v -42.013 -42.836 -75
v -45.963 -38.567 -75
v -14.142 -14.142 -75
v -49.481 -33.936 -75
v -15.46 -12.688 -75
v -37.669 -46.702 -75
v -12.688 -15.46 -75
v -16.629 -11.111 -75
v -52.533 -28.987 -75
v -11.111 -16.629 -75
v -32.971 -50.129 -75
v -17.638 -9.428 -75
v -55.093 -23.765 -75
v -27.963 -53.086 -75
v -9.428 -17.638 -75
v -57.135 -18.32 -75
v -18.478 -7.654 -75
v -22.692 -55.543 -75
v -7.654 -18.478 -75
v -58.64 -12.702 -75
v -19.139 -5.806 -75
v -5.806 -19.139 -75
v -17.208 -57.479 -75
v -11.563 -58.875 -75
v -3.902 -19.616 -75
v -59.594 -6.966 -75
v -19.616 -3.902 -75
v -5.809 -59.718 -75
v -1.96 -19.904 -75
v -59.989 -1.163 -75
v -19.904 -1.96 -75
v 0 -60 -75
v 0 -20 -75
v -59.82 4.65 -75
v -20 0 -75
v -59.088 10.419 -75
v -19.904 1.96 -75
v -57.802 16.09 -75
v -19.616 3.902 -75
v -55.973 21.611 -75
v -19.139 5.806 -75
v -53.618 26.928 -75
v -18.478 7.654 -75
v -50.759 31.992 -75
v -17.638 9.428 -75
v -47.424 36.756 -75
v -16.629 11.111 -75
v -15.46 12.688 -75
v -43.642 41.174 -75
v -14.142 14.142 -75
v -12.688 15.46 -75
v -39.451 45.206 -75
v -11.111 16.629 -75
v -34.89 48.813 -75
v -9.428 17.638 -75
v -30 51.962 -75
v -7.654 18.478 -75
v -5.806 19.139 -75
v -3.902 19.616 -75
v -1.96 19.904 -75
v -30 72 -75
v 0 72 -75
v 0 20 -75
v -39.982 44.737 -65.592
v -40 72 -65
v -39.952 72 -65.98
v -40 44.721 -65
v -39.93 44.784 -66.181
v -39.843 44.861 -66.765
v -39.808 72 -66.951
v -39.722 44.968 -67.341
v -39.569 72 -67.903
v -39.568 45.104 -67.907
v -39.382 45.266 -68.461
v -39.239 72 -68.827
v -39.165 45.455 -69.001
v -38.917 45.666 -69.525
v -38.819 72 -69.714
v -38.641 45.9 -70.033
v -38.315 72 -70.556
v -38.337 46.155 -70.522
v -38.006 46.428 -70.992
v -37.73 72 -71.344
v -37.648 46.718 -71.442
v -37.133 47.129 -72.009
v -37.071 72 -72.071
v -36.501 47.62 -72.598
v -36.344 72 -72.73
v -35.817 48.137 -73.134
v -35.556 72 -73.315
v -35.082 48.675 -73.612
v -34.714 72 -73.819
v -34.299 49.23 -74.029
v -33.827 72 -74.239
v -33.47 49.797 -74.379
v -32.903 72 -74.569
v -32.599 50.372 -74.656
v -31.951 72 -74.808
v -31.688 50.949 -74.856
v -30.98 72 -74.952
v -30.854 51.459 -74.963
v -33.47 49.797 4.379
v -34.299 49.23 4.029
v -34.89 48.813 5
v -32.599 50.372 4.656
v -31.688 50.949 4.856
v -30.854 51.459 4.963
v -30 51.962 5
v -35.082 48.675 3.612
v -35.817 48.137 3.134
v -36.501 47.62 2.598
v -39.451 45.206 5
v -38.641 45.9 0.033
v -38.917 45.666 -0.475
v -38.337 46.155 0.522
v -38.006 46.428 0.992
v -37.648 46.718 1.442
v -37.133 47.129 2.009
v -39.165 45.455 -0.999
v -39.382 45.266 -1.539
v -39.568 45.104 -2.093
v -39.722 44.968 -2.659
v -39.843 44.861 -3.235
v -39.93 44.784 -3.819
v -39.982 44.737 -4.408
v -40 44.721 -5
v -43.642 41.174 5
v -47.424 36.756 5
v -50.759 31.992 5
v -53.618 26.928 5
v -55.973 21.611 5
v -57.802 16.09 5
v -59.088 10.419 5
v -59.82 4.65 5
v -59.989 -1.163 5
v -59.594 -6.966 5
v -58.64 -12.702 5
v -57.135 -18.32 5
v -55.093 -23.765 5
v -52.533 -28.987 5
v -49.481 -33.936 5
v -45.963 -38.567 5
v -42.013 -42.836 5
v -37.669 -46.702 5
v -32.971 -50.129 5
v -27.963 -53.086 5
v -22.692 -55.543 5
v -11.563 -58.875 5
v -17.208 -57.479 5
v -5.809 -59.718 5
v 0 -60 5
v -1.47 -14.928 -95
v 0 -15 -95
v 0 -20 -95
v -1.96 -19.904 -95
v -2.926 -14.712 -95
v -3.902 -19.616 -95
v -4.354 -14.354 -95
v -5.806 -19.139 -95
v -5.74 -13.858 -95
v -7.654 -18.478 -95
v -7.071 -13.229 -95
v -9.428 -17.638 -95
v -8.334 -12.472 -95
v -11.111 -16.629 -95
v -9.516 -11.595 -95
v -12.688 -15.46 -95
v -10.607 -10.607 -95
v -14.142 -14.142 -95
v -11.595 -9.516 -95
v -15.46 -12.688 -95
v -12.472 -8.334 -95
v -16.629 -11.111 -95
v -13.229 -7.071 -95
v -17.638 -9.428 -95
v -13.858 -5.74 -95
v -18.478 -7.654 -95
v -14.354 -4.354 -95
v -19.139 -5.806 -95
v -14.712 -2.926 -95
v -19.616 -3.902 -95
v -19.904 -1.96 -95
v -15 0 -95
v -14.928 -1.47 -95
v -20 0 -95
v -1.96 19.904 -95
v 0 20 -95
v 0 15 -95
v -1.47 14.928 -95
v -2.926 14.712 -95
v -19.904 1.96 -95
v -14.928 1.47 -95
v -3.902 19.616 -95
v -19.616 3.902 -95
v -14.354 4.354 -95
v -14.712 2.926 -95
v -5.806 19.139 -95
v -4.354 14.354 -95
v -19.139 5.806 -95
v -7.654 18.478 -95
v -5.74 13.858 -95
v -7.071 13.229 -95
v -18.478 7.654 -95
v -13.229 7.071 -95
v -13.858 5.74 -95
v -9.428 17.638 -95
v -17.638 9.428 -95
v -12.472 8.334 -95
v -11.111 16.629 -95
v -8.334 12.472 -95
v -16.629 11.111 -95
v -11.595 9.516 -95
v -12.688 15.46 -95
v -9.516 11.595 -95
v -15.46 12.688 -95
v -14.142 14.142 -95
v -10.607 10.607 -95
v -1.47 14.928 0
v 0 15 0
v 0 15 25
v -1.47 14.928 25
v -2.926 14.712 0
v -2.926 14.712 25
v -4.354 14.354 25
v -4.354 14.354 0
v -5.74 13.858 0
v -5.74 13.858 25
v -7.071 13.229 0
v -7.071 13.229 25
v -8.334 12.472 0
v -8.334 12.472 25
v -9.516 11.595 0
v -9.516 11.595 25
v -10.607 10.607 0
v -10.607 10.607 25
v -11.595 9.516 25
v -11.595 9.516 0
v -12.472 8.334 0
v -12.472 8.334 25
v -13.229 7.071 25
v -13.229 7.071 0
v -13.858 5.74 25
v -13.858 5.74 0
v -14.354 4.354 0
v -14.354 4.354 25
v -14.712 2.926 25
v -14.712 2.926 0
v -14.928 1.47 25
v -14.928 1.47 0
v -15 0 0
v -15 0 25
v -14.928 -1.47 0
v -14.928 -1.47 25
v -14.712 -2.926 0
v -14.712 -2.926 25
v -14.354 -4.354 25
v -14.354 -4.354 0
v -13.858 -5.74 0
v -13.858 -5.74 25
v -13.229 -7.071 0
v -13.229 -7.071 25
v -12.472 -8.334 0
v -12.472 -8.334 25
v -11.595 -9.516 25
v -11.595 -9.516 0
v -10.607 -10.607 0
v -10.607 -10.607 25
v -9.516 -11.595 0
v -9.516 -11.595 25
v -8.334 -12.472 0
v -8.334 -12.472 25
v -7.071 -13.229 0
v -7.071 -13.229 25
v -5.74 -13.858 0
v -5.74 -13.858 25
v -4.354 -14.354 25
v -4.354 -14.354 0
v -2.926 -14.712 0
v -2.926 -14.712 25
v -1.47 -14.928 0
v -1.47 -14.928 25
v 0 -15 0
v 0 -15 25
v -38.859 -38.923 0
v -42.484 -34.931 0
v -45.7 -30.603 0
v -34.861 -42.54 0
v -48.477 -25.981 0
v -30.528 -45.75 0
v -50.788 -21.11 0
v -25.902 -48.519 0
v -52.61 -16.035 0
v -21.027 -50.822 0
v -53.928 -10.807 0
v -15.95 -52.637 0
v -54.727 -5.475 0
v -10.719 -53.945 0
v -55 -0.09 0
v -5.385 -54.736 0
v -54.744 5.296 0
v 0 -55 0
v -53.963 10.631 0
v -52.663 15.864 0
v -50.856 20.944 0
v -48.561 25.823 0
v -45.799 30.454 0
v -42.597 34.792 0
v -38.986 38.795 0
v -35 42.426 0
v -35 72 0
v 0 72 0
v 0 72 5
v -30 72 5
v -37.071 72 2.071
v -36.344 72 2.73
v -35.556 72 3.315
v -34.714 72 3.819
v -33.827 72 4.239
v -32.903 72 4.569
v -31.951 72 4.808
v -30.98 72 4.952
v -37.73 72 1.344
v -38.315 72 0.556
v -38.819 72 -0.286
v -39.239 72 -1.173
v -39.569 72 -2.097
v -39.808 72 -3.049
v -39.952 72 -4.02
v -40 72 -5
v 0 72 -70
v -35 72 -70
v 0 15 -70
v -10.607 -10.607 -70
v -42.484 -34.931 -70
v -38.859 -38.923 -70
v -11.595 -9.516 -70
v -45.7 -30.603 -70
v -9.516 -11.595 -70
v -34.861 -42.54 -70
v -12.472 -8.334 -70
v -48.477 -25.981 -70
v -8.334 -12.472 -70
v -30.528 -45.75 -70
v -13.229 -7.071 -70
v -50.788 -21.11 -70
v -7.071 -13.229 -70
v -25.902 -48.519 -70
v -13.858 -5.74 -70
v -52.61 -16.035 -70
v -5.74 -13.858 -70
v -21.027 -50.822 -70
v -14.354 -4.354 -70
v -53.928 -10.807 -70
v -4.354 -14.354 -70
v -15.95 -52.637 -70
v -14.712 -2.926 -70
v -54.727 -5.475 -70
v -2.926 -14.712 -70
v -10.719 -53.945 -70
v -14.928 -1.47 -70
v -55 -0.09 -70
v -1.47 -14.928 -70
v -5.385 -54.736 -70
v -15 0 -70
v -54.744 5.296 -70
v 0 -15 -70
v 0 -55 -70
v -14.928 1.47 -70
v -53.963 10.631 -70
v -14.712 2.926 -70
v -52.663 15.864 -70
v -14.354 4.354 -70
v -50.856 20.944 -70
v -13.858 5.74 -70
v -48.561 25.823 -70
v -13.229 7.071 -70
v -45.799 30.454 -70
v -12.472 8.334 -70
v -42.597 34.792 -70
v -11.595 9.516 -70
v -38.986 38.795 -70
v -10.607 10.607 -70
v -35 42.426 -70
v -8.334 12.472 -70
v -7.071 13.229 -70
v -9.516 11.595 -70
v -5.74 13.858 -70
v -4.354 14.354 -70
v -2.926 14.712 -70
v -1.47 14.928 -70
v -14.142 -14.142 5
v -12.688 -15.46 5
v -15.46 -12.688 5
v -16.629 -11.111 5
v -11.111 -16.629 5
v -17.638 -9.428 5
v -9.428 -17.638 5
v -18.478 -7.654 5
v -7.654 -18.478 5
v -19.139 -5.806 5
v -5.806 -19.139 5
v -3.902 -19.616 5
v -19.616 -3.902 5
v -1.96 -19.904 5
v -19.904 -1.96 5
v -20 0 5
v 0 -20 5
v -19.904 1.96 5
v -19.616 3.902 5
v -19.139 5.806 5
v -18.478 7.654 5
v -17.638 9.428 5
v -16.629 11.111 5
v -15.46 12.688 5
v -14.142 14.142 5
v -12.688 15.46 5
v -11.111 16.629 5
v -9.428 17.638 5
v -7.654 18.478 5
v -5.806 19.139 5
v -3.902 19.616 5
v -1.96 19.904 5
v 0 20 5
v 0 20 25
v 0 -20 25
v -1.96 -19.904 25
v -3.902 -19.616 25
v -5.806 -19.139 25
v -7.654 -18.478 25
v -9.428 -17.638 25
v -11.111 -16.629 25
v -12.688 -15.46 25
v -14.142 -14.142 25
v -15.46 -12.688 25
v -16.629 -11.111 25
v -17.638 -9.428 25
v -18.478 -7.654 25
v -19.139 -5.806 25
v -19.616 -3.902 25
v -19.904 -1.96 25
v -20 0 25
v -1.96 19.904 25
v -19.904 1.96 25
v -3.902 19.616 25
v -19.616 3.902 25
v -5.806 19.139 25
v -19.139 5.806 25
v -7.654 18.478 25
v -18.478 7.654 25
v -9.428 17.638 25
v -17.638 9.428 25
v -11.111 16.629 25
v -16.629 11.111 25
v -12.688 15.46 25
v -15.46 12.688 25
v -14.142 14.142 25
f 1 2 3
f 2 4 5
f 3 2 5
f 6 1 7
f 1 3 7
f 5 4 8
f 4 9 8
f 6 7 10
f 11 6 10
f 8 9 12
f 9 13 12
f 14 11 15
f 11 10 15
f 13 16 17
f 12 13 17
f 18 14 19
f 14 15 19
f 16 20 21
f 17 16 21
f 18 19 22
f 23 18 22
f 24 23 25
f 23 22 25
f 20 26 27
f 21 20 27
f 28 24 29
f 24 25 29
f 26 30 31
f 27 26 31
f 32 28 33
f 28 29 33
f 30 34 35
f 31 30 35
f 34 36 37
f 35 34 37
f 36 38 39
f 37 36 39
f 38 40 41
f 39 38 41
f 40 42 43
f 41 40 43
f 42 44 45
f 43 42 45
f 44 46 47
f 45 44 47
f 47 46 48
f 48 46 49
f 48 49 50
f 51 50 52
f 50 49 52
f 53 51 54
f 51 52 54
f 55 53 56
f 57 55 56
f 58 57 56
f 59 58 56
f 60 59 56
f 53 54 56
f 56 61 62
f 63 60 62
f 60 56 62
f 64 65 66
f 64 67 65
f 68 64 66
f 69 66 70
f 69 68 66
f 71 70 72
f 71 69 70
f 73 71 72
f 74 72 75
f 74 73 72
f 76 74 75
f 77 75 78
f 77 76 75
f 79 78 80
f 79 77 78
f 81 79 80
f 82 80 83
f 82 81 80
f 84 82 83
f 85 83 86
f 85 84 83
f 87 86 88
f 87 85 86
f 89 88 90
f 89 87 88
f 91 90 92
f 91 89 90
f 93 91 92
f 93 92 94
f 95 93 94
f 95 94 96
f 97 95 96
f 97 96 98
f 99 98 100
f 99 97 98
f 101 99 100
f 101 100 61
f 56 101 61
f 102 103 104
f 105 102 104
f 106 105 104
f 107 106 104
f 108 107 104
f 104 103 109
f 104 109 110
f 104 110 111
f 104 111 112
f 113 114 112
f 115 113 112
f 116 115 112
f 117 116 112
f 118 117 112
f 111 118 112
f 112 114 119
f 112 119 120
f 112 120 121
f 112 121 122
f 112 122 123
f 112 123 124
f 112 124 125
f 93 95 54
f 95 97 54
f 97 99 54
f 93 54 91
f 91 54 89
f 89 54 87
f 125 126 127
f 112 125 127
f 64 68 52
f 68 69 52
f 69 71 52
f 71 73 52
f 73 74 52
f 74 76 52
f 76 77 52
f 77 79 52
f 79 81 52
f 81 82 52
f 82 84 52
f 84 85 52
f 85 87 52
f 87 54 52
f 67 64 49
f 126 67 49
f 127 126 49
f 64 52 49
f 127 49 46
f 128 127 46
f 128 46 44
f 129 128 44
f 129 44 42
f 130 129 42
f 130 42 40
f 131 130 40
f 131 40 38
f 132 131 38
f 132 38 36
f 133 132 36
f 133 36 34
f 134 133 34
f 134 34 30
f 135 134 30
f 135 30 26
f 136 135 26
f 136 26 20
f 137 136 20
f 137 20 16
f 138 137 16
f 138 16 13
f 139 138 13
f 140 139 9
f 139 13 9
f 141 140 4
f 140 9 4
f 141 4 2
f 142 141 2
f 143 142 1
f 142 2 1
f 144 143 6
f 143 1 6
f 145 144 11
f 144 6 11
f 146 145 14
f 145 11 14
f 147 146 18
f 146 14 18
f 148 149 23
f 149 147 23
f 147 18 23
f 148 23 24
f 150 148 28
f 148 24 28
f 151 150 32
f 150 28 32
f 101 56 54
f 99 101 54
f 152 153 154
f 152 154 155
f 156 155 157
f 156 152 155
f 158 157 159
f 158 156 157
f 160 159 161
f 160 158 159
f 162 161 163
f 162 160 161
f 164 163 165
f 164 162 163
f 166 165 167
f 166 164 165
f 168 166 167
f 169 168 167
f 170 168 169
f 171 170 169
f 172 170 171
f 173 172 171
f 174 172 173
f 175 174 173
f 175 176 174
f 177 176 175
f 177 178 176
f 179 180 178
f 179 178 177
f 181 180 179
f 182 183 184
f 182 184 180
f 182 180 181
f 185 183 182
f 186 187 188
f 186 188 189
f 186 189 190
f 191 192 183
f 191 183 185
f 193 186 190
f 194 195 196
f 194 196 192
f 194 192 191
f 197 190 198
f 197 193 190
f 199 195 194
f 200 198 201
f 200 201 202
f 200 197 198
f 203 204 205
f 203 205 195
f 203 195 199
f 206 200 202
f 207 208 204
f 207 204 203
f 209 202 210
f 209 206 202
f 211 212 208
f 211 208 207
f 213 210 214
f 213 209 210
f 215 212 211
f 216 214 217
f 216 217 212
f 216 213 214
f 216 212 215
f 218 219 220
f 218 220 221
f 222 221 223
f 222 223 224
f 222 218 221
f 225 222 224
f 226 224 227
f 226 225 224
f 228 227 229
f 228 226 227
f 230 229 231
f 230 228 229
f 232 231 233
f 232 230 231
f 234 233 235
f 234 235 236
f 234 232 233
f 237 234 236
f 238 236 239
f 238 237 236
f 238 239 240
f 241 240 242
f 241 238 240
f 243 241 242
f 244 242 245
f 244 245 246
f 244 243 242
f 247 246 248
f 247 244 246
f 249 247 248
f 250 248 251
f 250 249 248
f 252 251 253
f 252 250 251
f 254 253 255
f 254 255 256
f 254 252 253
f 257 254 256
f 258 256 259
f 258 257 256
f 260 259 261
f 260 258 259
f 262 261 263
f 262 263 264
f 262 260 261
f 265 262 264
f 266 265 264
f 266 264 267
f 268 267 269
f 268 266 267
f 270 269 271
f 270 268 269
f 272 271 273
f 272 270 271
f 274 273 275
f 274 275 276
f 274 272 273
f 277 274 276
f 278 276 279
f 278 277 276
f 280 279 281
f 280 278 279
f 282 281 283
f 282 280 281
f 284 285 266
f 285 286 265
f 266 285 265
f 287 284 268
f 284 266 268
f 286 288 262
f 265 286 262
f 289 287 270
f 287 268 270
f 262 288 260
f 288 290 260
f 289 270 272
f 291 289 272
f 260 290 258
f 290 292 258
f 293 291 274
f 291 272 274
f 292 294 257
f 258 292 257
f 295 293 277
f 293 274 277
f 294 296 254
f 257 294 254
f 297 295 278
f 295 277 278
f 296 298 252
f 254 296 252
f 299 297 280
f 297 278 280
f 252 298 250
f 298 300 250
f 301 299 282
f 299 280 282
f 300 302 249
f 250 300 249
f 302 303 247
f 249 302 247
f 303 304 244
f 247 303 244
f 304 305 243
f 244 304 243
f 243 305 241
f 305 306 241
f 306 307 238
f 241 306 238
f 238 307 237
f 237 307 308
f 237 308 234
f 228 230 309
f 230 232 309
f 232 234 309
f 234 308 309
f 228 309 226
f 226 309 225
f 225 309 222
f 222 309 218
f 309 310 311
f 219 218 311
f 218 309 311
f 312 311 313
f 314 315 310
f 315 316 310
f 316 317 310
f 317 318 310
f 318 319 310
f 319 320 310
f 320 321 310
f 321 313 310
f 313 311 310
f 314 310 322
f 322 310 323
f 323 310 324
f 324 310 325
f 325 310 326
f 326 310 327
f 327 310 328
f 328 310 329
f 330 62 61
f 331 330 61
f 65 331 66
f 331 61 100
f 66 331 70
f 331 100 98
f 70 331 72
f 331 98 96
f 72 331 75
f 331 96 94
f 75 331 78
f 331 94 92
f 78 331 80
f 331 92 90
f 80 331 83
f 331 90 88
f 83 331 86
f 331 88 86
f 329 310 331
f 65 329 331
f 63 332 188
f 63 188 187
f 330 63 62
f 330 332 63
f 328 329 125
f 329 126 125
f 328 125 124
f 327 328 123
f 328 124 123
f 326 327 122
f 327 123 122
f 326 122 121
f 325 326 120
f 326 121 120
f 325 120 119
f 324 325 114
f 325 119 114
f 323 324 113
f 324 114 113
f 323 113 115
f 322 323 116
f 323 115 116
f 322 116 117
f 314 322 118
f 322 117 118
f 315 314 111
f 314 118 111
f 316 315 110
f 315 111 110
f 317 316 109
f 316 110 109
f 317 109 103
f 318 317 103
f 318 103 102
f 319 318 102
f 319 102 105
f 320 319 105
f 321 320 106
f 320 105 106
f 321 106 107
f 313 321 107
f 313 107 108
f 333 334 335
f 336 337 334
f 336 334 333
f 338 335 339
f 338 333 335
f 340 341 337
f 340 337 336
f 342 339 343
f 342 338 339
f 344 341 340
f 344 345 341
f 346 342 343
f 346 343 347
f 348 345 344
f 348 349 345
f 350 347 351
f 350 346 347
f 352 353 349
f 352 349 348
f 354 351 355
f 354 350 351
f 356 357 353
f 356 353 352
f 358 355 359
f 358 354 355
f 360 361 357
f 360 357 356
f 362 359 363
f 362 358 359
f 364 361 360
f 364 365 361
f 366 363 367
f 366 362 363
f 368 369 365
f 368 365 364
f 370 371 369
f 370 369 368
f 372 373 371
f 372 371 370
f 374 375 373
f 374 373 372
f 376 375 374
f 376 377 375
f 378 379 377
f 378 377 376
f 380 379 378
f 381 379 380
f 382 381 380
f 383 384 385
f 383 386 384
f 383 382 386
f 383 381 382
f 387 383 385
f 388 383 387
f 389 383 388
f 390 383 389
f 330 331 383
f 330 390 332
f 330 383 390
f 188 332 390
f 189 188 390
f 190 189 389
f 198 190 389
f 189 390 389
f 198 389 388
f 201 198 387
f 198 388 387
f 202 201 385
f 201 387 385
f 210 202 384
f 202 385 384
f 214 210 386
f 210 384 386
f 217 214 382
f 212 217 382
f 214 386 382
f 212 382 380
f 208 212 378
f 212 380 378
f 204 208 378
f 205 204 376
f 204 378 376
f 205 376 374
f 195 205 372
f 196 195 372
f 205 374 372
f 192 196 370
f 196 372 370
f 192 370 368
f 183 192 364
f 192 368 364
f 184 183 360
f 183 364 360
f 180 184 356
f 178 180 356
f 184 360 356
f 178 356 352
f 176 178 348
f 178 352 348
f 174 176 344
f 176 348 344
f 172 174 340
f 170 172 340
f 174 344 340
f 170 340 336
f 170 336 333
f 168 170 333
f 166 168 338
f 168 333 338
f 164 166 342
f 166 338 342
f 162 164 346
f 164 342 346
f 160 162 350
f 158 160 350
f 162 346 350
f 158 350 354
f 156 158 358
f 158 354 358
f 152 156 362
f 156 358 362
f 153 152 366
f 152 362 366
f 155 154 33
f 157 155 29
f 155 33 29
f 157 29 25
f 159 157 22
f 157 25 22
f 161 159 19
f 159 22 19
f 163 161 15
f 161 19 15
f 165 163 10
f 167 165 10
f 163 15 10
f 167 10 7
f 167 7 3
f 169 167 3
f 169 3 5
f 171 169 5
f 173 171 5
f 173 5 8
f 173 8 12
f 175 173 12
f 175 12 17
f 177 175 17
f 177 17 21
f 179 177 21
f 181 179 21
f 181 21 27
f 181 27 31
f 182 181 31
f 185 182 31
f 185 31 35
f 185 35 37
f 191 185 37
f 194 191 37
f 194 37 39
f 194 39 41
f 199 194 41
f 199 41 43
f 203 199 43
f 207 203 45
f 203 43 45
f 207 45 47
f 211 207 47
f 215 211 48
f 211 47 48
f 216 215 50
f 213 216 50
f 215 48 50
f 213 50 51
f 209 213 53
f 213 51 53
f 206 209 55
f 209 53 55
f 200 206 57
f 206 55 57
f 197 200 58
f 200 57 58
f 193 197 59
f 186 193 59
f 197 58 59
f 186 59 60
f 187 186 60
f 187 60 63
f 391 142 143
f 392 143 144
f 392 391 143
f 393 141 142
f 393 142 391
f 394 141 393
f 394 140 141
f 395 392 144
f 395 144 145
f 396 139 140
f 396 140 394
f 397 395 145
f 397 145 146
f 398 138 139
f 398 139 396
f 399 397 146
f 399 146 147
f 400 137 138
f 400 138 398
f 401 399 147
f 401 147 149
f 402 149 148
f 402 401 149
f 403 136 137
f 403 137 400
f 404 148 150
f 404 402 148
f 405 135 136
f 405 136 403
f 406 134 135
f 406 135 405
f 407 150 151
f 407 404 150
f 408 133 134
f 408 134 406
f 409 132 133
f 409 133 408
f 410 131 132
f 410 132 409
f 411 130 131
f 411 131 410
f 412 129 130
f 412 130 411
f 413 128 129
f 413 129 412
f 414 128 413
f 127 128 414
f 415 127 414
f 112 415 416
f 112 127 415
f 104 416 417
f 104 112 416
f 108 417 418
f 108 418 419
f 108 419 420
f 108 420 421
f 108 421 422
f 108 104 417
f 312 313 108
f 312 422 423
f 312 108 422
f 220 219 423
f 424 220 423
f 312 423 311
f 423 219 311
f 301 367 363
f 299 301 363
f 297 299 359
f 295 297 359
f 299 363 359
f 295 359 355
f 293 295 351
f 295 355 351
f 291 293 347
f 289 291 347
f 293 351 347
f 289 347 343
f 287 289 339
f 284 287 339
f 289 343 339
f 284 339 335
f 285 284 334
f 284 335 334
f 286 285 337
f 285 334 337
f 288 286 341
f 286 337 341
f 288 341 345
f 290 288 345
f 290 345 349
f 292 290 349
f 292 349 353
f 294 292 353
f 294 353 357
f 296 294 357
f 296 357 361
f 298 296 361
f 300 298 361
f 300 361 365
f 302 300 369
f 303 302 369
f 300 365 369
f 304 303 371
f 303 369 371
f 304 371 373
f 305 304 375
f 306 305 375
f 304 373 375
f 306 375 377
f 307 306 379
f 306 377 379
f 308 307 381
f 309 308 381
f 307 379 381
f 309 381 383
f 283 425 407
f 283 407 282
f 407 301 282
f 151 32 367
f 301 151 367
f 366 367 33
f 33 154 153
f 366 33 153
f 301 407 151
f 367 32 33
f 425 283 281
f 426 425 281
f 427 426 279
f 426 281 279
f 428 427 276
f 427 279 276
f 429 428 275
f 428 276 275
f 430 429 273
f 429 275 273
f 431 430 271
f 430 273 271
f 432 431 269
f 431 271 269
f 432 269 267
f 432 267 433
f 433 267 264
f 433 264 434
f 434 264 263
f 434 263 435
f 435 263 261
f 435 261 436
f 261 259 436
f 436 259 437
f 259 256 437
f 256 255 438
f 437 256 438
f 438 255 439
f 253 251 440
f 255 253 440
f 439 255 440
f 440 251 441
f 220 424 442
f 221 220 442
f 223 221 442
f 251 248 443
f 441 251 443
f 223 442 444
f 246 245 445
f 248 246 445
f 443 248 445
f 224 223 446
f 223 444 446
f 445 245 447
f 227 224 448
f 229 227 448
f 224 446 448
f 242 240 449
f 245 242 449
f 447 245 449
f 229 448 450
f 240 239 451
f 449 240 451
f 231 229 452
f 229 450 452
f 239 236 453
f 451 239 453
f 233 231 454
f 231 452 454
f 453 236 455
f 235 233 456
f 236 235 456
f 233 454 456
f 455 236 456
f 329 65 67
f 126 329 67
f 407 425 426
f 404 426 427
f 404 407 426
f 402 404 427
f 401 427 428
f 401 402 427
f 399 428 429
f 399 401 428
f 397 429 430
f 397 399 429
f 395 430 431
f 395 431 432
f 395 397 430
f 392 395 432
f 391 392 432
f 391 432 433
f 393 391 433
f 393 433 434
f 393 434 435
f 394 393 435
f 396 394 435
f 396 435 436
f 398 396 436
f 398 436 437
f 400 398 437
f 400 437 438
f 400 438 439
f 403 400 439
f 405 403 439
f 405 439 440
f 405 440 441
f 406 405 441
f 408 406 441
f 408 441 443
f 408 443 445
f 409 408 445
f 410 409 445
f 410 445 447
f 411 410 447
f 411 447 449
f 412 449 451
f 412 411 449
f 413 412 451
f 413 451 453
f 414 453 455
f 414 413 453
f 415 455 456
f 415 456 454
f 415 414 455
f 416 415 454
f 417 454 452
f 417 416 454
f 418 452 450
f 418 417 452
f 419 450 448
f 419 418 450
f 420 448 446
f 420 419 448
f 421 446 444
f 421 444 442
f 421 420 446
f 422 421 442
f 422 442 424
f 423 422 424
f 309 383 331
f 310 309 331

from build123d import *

# Parameters (mm, degrees)
DODANIE_WYCI_GNI_CIE1_DEPTH       = 25
DODANIE_WYCI_GNI_CIE2_DEPTH       = 5
WYCI_GNI_CIE_CIENKA_START         = -70
WYCI_GNI_CIE_CIENKA_CIANKA1_DEPTH = 70
ZAOKR_GLENIE1_R                   = 10


with BuildPart() as part:
    # Szkic1 → Dodanie-wyciągnięcie1 (new body)
    with BuildSketch(Plane.XY):
        with BuildLine():
            Line((0, 20), (0, 15))
            ThreePointArc((0, 15), (-15, 0), (0, -15))
            Line((0, -15), (0, -20))
            ThreePointArc((0, -20), (-20, 0), (0, 20))
        make_face()
    extrude(amount=DODANIE_WYCI_GNI_CIE1_DEPTH)

    # Szkic2 → Dodanie-wyciągnięcie2 (add)
    with BuildSketch(Plane.XY):
        with BuildLine():
            Line((0, 20), (0, 72))
            Line((0, 72), (-40, 72))
            Line((-40, 72), (-40, 44.72135955))
            ThreePointArc((-40, 44.72135955), (-56.050341538, -21.409325386), (0, -60))
            Line((0, -60), (0, -20))
            ThreePointArc((0, -20), (-20, 0), (0, 20))
        make_face()
    extrude(amount=DODANIE_WYCI_GNI_CIE2_DEPTH)


with BuildPart() as body_2:
    # Lustro1: mirrored copy
    add(part.part.mirror(Plane.XY.offset(-35)))


with BuildPart() as part_1:
    add(part.part)

    add(body_2.part)  # Wyciągnięcie-cienka ścianka1 merges body 2
    # Szkic3 → Wyciągnięcie-cienka ścianka1 (add)
    with BuildSketch(Plane.XY.offset(WYCI_GNI_CIE_CIENKA_START)):
        with BuildLine():
            Line((-40, 72), (-40, 44.72135955))
            ThreePointArc((-40, 44.72135955), (-56.050341538, -21.409325386), (0, -60))
            Line((0, -60), (0, -55))
            ThreePointArc((0, -55), (-51.76124215, -18.594994247), (-35, 42.426406871))
            Line((-35, 42.426406871), (-35, 72))
            Line((-35, 72), (-40, 72))
        make_face()
    extrude(amount=WYCI_GNI_CIE_CIENKA_CIANKA1_DEPTH)

    # Zaokrąglenie1
    zaokr_glenie1_edges = [part_1.edges().sort_by_distance(p)[0] for p in [
        (-40, 58.360679775, 5),
        (-40, 58.360679775, -75),
    ]]
    fillet(zaokr_glenie1_edges, radius=ZAOKR_GLENIE1_R)


solid = part_1.part
